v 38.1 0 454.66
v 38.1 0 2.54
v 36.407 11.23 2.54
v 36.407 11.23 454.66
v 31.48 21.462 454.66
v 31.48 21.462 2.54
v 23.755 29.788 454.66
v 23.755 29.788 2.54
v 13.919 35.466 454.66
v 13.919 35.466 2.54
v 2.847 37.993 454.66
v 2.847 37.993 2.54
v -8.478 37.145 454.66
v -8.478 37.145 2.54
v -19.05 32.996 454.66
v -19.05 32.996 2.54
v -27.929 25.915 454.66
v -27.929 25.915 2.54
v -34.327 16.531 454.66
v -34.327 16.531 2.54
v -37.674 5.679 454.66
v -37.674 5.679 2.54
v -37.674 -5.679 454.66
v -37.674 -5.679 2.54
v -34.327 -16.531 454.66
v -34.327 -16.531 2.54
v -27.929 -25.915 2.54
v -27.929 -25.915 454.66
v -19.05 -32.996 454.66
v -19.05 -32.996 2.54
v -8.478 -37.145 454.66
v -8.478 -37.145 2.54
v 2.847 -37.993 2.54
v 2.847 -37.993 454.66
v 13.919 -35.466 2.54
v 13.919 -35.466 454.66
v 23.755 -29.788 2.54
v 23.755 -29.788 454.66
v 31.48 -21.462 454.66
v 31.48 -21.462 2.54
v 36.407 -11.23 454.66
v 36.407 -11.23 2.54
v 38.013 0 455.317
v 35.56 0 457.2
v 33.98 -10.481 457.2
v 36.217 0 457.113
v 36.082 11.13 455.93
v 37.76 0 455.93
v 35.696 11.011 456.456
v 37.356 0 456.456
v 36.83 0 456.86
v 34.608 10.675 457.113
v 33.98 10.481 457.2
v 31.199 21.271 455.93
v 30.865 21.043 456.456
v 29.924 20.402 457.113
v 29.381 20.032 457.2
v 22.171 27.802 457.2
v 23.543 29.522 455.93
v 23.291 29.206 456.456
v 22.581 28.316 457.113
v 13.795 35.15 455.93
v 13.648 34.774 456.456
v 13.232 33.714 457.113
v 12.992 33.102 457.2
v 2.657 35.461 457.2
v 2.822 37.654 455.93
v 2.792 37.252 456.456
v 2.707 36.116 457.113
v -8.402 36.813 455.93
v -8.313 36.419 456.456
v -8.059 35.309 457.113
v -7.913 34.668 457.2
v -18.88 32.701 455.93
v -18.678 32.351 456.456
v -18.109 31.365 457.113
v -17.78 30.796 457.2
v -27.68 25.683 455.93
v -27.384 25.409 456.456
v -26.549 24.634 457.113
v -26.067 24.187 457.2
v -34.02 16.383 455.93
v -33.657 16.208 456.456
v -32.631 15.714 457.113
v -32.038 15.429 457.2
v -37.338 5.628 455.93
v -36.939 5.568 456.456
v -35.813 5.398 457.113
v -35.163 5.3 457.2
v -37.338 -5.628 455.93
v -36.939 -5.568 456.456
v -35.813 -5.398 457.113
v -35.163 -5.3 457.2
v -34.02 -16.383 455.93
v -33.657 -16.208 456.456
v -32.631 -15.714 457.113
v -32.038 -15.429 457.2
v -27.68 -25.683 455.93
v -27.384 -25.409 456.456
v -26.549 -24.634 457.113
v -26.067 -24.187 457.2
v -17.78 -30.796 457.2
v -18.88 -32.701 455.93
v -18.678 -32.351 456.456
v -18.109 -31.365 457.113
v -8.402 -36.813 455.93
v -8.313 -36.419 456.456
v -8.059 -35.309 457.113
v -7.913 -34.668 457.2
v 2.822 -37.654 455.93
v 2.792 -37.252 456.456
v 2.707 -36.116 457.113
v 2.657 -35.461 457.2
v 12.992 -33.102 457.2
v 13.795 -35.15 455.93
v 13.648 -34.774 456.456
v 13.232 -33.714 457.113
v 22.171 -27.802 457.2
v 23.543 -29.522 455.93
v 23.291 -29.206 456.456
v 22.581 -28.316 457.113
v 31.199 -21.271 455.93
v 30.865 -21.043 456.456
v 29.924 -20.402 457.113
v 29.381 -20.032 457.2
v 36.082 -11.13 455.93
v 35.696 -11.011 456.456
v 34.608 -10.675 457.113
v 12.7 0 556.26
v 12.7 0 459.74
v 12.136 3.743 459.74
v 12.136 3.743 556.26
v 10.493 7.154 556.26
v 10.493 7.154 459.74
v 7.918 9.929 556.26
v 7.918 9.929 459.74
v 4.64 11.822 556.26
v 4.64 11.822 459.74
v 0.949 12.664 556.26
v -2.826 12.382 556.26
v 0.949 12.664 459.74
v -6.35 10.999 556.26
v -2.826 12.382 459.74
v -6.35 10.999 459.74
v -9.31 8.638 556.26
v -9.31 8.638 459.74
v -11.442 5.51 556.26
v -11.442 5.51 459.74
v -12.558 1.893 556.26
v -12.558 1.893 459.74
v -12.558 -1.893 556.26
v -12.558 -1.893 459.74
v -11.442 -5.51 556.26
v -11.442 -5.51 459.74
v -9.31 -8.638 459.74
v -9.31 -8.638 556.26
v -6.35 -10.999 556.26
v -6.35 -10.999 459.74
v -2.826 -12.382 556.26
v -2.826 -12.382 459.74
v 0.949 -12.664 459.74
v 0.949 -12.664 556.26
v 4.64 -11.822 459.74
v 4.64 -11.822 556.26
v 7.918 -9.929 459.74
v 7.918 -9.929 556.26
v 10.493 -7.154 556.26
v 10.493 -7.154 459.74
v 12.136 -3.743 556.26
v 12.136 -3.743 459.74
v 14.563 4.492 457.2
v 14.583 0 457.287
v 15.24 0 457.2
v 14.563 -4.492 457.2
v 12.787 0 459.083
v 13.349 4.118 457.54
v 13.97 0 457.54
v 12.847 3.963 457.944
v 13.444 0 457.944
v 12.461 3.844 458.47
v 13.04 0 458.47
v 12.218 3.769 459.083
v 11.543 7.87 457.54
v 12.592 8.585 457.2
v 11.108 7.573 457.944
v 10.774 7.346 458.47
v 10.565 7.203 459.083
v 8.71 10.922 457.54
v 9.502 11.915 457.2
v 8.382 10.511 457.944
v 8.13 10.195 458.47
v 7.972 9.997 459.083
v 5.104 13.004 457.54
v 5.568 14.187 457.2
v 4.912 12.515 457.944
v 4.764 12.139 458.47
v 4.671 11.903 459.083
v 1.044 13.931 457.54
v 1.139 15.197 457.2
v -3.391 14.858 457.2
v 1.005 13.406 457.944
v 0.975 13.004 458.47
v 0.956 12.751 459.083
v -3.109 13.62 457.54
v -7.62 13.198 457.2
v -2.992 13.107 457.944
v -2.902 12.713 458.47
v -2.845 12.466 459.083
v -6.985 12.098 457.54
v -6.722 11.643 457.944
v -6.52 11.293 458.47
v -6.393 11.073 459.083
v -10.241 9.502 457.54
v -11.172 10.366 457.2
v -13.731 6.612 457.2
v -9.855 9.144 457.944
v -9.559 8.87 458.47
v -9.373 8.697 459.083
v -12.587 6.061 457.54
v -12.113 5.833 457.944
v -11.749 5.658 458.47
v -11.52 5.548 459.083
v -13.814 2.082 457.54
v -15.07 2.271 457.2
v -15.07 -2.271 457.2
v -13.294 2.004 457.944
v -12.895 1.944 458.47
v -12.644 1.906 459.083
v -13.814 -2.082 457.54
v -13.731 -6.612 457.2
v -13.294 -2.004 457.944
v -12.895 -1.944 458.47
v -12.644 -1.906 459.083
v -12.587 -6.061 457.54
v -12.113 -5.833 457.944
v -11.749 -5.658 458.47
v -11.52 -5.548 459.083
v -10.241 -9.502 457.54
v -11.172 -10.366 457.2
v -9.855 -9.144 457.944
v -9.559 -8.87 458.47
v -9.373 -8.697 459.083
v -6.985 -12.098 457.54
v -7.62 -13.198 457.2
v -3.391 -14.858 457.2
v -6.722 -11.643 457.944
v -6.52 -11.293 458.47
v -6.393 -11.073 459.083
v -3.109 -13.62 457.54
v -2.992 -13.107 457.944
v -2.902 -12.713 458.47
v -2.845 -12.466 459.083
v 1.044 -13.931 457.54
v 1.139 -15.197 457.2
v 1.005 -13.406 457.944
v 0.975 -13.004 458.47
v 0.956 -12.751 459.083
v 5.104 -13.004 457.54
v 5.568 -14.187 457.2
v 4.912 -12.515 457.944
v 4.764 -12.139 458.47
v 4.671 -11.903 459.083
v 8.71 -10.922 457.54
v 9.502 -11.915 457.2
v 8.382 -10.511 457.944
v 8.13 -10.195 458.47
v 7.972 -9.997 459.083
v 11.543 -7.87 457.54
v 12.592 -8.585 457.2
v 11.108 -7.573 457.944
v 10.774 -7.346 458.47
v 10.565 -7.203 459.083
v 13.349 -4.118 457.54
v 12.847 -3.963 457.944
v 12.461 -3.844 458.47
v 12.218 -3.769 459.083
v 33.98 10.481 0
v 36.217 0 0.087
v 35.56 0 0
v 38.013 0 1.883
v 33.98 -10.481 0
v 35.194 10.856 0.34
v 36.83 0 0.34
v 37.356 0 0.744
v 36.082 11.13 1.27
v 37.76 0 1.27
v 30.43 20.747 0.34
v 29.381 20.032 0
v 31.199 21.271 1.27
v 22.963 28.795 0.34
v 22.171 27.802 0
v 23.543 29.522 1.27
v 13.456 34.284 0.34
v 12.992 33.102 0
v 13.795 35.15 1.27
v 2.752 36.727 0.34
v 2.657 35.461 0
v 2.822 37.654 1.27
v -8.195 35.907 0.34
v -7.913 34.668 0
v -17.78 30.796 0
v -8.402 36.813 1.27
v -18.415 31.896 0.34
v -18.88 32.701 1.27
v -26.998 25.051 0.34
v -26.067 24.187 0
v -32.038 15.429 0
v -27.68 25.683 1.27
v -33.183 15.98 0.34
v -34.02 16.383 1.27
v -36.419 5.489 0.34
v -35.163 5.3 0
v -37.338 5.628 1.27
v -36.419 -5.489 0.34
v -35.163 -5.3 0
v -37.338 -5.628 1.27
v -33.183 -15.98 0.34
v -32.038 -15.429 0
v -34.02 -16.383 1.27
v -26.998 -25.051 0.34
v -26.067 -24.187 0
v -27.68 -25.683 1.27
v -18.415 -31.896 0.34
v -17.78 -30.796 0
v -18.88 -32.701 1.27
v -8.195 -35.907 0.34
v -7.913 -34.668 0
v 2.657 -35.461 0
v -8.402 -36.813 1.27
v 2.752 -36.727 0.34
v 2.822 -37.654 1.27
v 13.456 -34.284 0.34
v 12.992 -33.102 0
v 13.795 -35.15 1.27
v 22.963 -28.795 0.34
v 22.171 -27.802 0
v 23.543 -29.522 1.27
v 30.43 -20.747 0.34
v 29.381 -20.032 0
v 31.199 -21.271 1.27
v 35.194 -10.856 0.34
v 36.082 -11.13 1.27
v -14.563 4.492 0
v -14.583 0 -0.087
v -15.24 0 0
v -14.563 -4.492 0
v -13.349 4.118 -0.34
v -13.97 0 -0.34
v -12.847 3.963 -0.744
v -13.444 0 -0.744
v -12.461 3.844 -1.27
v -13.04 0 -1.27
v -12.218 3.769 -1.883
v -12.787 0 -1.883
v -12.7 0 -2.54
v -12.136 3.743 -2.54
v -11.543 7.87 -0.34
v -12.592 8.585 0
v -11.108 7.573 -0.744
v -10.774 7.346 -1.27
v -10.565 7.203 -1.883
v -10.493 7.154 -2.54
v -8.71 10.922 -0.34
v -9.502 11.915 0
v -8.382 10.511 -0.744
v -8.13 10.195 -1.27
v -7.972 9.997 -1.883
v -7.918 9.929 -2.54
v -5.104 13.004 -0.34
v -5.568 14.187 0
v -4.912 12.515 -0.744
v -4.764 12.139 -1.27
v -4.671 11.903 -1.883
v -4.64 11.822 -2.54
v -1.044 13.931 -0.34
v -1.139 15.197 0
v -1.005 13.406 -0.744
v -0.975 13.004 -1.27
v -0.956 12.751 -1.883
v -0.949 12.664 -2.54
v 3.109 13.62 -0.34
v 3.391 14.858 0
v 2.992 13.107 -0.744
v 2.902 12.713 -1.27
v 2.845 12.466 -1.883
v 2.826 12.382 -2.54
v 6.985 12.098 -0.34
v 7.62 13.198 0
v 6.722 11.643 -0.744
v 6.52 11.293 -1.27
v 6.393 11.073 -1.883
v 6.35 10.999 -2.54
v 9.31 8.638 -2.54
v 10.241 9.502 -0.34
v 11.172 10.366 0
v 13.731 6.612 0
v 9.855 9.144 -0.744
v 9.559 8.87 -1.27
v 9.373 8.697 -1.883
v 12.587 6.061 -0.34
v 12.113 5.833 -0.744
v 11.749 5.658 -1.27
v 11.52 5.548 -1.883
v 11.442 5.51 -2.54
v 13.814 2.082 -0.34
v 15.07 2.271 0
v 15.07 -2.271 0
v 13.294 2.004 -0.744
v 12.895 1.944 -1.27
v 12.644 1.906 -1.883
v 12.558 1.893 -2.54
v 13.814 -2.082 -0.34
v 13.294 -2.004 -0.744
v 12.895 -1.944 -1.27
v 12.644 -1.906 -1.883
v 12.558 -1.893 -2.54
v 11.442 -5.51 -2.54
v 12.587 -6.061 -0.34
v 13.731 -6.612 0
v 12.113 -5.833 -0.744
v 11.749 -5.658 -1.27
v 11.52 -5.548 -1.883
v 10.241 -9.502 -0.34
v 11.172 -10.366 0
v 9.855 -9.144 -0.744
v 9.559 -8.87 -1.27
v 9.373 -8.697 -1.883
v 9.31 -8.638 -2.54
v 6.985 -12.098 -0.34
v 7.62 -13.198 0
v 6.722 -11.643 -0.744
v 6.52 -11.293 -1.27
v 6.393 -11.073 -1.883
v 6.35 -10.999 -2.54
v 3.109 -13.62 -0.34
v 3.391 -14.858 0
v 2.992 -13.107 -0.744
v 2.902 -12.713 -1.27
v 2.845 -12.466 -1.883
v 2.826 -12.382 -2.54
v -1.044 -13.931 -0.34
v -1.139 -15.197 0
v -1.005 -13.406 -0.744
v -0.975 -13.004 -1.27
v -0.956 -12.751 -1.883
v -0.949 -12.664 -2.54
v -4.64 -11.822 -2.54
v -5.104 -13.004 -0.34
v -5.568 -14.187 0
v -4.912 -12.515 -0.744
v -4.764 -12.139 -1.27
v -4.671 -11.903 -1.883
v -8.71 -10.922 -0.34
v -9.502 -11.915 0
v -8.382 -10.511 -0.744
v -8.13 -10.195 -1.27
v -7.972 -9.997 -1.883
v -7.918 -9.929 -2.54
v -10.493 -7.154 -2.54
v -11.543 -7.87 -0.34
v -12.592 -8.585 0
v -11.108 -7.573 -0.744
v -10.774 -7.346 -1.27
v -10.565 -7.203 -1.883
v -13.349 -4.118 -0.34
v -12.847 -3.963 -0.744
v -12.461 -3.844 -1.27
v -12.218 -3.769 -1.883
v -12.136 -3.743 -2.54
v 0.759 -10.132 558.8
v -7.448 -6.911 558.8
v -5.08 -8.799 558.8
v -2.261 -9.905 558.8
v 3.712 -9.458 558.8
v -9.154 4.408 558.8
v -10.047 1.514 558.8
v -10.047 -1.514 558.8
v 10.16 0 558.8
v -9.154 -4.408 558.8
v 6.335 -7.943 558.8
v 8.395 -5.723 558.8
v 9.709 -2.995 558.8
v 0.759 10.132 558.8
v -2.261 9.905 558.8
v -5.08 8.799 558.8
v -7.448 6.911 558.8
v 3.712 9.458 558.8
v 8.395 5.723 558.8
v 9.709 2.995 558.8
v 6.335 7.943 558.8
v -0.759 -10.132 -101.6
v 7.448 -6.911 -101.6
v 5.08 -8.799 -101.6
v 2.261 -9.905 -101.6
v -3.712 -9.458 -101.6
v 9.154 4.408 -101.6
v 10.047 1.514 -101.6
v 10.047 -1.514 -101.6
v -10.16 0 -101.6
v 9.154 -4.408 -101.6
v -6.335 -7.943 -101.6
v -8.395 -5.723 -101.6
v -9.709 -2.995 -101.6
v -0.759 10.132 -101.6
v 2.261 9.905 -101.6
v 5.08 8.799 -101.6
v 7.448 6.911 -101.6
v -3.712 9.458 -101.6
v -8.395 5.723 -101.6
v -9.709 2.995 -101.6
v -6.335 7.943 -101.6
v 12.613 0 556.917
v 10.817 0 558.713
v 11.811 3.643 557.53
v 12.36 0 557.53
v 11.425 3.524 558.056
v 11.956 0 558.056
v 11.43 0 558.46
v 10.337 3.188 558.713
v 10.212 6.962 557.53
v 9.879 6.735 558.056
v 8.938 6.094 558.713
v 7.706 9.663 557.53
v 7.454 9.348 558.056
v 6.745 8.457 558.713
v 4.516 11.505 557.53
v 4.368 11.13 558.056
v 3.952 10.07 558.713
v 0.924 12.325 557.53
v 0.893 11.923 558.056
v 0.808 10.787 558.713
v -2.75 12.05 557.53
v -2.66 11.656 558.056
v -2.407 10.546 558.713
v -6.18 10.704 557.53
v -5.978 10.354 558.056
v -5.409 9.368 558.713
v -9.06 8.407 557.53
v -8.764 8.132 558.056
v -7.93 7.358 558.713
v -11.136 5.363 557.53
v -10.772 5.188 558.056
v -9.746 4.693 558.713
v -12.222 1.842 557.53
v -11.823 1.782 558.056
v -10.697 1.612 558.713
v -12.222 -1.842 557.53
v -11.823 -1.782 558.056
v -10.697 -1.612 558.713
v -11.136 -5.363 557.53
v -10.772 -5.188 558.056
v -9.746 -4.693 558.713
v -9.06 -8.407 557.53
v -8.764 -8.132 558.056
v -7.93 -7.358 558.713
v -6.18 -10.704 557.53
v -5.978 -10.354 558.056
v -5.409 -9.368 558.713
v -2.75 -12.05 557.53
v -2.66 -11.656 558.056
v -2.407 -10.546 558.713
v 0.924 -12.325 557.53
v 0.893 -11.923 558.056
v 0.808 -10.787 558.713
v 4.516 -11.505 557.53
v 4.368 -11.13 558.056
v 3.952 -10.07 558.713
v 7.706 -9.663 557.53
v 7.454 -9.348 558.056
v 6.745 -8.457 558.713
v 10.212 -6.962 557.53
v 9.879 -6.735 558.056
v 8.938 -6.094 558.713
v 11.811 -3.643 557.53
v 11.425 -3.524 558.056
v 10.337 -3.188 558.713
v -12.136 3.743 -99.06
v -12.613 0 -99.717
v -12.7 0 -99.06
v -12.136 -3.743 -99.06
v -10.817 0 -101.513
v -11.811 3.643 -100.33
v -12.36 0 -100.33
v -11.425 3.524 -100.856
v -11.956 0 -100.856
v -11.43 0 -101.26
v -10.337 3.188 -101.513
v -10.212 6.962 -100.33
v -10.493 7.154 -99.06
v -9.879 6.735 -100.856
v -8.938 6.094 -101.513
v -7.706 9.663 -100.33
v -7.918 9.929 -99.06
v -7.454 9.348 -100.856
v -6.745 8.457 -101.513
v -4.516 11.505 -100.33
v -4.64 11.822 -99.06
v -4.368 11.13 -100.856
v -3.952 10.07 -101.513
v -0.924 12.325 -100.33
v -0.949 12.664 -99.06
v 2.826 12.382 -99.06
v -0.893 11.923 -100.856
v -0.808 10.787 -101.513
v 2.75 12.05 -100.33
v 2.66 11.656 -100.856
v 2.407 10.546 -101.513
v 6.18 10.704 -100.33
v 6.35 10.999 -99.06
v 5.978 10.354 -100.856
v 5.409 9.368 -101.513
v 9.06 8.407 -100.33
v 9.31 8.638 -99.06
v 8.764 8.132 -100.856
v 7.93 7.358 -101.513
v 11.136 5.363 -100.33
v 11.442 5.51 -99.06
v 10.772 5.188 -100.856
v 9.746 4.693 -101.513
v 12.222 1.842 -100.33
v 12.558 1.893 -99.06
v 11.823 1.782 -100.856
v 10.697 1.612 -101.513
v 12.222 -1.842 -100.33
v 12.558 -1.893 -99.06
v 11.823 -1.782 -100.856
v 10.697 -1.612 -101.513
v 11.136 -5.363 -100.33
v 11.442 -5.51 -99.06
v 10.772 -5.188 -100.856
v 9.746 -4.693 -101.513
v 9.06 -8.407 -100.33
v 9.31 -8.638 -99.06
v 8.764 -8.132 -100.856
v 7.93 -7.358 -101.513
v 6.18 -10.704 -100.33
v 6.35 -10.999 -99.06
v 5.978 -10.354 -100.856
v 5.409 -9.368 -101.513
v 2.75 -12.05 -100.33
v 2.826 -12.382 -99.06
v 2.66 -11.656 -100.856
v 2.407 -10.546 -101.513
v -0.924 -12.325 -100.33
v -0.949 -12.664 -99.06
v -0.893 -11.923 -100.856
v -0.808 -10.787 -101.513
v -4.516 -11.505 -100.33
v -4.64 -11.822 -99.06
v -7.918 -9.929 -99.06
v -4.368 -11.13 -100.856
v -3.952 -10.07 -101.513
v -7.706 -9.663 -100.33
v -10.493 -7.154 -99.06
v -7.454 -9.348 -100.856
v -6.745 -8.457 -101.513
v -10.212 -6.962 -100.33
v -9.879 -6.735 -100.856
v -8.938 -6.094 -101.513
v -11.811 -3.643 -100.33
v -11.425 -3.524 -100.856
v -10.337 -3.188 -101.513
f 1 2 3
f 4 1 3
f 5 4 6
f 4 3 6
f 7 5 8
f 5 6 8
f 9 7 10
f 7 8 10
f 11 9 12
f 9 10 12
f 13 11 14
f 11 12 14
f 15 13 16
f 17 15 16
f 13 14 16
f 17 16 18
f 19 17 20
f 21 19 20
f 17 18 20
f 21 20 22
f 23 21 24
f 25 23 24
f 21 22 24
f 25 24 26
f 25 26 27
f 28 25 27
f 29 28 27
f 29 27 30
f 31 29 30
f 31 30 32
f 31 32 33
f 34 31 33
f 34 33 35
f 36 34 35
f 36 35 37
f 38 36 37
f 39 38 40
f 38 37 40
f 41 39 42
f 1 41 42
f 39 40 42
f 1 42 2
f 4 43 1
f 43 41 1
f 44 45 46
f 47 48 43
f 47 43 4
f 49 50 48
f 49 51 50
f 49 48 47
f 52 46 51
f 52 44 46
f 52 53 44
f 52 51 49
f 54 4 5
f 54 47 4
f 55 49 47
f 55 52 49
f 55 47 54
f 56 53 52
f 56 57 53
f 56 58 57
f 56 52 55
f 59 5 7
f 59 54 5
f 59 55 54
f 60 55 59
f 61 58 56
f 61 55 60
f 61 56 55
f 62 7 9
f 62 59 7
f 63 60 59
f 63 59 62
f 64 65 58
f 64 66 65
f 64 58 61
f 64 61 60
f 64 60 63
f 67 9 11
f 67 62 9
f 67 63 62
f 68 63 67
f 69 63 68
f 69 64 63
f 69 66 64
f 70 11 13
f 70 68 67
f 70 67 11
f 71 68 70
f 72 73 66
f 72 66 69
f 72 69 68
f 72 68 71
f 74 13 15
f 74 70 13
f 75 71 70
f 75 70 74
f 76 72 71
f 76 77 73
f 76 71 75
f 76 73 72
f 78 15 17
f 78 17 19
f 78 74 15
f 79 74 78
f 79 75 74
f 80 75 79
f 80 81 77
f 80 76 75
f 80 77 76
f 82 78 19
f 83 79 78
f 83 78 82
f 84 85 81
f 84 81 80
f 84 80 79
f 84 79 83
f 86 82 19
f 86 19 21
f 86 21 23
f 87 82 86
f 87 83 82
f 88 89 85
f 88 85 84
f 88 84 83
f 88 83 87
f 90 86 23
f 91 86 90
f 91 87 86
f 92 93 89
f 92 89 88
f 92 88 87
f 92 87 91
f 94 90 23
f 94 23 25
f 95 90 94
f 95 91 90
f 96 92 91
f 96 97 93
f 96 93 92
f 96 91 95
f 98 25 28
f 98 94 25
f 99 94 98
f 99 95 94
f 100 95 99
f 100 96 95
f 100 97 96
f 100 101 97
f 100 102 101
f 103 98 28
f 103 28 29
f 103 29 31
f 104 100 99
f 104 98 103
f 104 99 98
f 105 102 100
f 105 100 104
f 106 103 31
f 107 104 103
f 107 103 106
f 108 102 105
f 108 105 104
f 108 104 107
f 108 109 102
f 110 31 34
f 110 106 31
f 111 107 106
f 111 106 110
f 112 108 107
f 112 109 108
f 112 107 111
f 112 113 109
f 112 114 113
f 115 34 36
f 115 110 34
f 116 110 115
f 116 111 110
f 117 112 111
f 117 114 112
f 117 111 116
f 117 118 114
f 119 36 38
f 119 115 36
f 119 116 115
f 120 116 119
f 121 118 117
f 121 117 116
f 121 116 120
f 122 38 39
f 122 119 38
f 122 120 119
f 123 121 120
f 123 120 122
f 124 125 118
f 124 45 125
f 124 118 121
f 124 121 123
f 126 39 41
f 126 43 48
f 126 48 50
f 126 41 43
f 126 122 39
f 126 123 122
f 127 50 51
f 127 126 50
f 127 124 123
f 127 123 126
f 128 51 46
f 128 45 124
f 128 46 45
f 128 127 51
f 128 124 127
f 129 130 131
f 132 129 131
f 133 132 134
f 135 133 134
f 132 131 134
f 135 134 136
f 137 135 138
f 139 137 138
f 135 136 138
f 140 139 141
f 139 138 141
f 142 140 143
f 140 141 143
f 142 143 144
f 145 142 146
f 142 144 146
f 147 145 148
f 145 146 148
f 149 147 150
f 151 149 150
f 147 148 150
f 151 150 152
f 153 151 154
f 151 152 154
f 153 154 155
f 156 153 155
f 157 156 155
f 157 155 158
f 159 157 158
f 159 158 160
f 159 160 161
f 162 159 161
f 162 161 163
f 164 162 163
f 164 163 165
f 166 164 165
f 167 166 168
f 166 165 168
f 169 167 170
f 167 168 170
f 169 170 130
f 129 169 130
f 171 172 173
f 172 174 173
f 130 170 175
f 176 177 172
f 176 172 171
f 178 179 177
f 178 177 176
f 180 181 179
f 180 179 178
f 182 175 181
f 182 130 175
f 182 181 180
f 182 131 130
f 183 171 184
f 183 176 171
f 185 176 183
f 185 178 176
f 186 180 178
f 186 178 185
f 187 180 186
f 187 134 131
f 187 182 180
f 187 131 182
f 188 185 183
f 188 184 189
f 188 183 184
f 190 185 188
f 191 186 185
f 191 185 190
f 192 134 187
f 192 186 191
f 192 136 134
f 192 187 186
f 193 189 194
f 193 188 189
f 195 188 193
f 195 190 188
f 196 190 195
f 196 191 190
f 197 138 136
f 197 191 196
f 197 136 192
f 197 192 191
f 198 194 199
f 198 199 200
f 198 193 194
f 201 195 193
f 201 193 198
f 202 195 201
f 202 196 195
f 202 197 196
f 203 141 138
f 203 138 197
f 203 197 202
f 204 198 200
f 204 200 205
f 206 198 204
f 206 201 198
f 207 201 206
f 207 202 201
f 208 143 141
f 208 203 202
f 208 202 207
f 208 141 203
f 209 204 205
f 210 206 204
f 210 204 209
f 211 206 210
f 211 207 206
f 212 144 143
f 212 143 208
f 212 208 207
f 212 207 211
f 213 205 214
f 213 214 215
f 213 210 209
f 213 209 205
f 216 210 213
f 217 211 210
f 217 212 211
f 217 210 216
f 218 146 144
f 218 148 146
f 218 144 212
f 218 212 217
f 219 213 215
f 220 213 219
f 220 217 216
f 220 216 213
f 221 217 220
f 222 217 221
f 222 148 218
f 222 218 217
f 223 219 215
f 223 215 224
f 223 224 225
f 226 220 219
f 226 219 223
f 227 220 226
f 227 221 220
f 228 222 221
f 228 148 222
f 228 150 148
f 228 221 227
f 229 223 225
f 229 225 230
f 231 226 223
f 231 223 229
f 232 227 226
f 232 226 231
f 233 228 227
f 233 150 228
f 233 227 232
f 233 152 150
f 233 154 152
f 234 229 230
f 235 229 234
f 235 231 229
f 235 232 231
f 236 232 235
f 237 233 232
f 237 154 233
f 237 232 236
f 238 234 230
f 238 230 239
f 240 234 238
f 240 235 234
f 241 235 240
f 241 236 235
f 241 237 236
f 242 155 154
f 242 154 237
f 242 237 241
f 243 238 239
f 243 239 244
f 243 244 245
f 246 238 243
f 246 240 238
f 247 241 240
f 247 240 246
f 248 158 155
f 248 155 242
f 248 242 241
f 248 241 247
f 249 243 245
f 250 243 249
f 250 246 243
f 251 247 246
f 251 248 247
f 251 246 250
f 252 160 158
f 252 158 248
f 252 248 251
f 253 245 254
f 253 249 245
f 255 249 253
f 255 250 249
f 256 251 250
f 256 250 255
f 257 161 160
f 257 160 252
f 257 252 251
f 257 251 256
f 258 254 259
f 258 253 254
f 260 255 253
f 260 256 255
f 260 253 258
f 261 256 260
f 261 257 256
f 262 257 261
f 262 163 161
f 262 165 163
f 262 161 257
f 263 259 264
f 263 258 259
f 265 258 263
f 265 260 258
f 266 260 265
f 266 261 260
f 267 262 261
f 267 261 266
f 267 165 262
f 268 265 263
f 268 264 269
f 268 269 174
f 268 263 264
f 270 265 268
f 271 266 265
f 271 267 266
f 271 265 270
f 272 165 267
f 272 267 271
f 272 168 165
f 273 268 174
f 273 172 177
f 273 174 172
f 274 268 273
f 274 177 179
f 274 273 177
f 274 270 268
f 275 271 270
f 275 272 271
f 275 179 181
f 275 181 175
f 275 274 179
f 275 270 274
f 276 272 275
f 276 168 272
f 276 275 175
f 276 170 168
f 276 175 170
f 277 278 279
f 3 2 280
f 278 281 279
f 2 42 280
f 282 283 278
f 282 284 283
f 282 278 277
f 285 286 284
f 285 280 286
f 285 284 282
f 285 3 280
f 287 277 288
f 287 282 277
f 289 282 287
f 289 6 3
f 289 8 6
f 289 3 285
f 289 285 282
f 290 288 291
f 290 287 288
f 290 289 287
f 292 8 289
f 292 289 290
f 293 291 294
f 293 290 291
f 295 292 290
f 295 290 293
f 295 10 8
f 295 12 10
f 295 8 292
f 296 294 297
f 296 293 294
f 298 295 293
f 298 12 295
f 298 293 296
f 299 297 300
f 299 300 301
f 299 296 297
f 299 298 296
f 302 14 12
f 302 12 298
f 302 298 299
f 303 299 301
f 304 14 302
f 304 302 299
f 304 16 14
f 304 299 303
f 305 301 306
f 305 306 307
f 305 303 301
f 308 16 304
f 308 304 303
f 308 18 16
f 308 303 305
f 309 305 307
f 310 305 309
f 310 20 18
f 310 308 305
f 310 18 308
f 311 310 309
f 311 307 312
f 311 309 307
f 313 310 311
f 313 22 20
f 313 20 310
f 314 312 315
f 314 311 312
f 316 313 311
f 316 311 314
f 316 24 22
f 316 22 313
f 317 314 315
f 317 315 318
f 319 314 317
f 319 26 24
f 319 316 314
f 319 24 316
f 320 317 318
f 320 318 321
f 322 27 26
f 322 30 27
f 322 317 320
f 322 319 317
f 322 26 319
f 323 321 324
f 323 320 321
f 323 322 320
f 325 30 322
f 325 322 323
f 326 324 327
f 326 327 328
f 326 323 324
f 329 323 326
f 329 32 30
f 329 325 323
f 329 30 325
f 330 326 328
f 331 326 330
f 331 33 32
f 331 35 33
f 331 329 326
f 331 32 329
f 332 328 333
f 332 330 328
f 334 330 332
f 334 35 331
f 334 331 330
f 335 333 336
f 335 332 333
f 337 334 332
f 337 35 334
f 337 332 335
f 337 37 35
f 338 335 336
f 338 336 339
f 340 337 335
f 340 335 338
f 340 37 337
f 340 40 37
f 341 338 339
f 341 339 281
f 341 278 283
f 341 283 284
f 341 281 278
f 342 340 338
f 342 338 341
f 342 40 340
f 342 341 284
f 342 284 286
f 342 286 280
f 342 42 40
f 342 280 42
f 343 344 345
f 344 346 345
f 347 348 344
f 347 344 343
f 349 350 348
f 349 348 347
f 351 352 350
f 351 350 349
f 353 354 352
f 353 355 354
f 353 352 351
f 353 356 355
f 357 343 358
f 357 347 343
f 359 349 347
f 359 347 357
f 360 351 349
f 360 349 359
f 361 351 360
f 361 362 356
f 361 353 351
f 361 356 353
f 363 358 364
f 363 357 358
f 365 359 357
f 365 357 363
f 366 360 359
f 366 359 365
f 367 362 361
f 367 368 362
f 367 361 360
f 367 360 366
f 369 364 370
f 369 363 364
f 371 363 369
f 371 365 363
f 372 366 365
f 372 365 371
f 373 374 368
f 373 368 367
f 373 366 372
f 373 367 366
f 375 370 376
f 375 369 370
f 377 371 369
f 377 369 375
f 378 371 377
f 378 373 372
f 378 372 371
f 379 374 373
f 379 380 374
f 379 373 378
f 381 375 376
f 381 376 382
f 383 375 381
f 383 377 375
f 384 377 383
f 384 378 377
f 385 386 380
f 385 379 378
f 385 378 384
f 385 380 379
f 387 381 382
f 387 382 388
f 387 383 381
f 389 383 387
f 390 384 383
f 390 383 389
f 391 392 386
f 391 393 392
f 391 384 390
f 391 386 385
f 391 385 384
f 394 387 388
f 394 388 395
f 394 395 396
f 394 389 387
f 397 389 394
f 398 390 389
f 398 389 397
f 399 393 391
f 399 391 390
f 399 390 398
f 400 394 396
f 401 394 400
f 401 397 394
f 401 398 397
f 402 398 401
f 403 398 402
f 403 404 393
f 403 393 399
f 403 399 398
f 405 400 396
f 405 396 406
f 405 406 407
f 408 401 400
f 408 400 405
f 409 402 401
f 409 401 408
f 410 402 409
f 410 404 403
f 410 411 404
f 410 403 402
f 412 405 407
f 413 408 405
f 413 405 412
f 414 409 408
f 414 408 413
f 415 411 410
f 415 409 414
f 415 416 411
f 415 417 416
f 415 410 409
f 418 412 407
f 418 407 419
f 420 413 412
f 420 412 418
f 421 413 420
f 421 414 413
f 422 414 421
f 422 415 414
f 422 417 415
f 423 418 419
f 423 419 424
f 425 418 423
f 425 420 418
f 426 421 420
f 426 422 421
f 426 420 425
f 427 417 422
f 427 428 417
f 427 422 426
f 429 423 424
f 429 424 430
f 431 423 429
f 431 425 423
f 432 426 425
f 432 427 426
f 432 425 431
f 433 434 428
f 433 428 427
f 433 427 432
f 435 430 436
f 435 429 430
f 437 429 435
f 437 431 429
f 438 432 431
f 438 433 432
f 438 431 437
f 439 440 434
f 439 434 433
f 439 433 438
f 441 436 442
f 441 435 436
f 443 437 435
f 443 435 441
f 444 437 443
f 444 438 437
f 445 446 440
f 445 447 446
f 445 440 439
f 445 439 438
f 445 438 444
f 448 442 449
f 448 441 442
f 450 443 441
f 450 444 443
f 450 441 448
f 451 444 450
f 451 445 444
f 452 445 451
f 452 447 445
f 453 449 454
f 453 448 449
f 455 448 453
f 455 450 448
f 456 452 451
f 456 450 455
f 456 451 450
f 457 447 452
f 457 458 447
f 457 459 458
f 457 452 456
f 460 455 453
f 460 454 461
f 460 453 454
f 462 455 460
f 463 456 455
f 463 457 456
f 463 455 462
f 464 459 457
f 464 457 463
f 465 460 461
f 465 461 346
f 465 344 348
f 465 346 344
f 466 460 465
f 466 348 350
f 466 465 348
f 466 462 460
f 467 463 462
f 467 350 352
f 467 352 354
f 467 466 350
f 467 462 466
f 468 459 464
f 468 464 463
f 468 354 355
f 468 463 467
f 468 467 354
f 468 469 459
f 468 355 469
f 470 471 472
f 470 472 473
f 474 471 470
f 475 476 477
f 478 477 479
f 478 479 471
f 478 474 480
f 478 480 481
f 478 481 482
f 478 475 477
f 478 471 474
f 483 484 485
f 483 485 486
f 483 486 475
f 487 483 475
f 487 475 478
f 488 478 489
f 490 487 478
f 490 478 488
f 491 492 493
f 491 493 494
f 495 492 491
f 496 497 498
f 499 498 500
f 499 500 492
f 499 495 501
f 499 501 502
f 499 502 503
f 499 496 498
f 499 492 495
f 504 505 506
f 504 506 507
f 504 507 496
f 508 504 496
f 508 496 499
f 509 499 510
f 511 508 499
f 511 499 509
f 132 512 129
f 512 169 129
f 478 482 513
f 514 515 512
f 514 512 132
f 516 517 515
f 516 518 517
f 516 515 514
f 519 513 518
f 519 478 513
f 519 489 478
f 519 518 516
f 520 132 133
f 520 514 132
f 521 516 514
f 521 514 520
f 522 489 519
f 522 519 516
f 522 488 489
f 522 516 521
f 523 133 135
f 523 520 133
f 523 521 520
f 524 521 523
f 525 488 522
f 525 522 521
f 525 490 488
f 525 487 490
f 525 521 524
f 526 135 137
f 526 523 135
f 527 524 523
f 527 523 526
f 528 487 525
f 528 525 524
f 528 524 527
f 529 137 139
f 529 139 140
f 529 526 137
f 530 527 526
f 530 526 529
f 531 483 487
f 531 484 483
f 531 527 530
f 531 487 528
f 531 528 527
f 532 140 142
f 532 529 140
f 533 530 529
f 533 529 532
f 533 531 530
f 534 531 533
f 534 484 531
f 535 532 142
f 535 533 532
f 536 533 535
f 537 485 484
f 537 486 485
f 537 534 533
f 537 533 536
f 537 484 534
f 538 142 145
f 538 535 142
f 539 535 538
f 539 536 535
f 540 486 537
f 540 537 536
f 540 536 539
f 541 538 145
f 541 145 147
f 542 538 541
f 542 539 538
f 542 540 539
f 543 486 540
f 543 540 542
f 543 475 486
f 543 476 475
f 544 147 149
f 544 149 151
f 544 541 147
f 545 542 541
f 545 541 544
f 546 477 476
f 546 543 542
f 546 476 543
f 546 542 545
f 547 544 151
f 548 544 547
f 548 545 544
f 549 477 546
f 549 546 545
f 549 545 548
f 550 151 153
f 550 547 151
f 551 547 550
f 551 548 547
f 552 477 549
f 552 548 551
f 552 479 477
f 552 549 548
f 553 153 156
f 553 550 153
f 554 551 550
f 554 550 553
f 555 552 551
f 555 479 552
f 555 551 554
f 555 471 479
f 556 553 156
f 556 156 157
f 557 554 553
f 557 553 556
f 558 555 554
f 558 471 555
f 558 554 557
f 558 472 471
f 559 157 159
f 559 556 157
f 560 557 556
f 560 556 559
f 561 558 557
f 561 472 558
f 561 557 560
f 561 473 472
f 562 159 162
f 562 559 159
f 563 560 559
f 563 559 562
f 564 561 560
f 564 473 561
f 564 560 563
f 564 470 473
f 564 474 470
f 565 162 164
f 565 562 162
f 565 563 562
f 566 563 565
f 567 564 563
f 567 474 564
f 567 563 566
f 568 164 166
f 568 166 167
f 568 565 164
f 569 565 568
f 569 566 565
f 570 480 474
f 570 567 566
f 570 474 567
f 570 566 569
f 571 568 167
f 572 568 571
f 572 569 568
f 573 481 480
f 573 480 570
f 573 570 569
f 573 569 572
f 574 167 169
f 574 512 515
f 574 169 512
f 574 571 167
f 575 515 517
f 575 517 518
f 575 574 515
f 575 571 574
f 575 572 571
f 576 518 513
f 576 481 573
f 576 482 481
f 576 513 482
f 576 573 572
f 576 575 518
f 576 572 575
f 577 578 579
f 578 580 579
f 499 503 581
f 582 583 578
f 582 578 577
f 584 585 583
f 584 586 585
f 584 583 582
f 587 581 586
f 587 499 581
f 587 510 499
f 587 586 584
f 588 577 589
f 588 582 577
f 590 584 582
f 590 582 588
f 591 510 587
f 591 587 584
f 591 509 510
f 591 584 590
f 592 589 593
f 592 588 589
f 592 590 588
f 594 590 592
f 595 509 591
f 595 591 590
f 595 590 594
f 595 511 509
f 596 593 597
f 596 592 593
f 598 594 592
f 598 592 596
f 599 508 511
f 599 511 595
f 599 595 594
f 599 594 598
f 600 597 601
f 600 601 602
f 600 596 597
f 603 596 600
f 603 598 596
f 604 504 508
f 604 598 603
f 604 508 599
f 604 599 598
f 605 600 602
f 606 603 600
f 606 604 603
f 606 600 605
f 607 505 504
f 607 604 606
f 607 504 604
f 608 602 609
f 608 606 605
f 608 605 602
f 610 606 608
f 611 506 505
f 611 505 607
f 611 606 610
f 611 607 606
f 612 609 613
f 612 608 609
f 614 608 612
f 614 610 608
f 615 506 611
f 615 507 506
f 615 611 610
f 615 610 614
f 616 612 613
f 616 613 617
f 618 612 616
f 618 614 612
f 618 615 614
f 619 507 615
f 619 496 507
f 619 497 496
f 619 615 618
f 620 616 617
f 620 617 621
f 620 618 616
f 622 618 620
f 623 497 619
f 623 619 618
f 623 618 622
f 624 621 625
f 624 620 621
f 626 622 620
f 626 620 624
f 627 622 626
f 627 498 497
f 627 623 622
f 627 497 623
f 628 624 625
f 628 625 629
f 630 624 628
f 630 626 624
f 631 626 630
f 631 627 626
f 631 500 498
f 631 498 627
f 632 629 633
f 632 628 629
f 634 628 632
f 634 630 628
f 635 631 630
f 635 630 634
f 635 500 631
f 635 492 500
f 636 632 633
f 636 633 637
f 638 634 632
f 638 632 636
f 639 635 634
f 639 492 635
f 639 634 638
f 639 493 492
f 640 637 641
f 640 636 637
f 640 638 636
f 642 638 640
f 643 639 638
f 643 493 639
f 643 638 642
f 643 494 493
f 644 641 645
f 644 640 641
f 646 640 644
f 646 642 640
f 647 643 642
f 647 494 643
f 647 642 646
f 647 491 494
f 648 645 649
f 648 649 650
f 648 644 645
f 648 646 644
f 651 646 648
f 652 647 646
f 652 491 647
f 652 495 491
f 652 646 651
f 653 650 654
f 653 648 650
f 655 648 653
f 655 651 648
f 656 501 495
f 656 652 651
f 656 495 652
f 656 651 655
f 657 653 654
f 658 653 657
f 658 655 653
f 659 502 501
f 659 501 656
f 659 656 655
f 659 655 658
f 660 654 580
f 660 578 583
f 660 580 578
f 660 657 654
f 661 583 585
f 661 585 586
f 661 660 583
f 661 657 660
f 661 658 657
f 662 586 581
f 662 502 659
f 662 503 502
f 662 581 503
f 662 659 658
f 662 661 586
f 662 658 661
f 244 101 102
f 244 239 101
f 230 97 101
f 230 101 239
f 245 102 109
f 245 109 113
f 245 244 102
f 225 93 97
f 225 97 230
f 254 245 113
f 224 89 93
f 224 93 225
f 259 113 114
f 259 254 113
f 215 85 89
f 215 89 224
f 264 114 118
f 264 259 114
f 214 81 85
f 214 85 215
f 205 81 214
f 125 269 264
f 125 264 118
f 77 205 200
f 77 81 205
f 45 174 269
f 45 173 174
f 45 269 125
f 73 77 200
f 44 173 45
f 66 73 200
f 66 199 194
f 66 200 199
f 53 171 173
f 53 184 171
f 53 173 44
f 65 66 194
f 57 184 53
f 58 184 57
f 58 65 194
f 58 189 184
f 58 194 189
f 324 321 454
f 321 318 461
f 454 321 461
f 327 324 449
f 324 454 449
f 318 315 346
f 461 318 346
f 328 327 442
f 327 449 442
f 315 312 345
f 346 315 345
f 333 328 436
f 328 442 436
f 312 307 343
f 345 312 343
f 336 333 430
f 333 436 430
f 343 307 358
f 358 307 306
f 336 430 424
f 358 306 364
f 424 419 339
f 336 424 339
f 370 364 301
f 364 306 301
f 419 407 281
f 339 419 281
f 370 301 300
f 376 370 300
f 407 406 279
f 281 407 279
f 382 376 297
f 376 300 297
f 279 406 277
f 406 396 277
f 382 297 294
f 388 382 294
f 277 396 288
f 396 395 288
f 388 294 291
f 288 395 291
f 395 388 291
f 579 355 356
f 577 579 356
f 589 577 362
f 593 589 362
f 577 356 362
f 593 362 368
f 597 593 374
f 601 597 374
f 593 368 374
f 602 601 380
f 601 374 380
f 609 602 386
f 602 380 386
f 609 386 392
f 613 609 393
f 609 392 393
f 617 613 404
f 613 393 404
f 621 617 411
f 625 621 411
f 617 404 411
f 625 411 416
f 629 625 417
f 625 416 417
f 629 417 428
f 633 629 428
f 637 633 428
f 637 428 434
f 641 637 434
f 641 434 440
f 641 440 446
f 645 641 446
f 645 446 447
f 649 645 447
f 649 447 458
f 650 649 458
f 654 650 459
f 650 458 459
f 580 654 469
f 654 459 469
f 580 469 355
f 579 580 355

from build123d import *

# Parameters (mm, degrees)
SKETCH1_R           = 38.1
BOSS_EXTRUDE1_DEPTH = 457.2
SKETCH2_R           = 12.7
BOSS_EXTRUDE2_DEPTH = 101.6
SKETCH3_R           = 12.7
BOSS_EXTRUDE3_DEPTH = 101.6
FILLET1_R           = 2.54
FILLET2_R           = 2.54


with BuildPart() as part:
    # Sketch1 → Boss-Extrude1 (new body)
    with BuildSketch(Plane.XY):
        Circle(SKETCH1_R)
    extrude(amount=BOSS_EXTRUDE1_DEPTH)

    # Sketch2 → Boss-Extrude2 (add)
    with BuildSketch(Plane(origin=(0, 0, 0), x_dir=(-1, 0, 0), z_dir=(0, 0, -1))):
        Circle(SKETCH2_R)
    extrude(amount=BOSS_EXTRUDE2_DEPTH)

    # Sketch3 → Boss-Extrude3 (add)
    with BuildSketch(Plane.XY.offset(457.2)):
        Circle(SKETCH3_R)
    extrude(amount=BOSS_EXTRUDE3_DEPTH)

    # Fillet1
    fillet1_edges = [part.edges().sort_by_distance(p)[0] for p in [
        (-12.7, 0, 457.2),
        (12.7, 0, 0),
    ]]
    fillet(fillet1_edges, radius=FILLET1_R)

    # Fillet2
    fillet2_edges = [part.edges().sort_by_distance(p)[0] for p in [
        (-12.7, 0, 558.8),
        (-38.1, 0, 0),
        (-38.1, 0, 457.2),
        (12.7, 0, -101.6),
    ]]
    fillet(fillet2_edges, radius=FILLET2_R)


solid = part.part
